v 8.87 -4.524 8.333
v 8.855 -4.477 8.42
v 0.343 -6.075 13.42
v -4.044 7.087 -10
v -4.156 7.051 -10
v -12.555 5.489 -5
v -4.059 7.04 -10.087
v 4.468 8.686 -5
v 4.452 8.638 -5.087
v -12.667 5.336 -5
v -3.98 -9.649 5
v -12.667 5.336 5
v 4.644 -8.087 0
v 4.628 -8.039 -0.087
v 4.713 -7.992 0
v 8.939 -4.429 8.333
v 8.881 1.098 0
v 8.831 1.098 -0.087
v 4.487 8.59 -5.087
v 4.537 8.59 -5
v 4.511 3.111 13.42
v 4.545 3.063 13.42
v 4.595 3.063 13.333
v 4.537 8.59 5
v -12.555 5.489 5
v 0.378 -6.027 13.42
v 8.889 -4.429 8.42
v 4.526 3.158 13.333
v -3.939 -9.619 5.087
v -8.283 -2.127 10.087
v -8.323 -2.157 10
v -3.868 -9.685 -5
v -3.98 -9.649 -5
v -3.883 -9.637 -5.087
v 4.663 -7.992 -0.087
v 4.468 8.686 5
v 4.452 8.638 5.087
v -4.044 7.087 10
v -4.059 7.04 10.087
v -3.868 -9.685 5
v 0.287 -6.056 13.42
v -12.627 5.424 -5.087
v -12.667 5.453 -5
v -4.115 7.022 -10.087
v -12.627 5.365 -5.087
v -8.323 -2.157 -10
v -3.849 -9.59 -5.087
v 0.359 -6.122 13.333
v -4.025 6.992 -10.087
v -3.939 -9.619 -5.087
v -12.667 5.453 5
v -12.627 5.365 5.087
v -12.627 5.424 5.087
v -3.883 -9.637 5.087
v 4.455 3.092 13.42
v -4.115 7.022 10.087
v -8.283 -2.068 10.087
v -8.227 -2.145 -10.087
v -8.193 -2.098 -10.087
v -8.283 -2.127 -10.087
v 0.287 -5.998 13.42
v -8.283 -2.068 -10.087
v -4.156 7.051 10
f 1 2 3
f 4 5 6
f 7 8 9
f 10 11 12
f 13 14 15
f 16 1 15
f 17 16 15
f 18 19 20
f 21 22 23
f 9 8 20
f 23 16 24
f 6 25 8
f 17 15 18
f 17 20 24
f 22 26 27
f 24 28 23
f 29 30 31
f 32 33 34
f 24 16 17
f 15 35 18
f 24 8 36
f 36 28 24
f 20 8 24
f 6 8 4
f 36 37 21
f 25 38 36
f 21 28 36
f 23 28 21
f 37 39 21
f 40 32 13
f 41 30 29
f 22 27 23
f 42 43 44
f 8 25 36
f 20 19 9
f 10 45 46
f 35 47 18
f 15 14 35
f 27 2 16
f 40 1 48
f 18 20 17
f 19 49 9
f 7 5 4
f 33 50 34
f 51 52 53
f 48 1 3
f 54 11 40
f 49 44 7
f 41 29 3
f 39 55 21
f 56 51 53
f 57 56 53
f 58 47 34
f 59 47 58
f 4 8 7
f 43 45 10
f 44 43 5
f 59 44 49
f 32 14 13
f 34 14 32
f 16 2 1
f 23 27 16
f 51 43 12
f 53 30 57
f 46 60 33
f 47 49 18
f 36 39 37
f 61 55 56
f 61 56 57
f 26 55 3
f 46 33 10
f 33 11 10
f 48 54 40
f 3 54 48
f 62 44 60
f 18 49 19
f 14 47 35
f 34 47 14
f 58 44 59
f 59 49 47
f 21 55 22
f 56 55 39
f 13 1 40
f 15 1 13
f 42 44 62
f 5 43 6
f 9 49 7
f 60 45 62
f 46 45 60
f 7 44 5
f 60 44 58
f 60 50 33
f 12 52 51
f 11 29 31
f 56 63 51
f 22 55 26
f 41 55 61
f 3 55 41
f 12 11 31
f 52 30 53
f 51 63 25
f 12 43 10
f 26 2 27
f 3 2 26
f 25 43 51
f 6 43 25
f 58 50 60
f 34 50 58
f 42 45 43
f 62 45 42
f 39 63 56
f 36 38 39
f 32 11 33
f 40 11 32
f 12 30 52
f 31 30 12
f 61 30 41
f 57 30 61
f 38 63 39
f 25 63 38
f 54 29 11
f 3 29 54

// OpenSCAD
// Auto-generated OpenSCAD file

    inner_points = 10*[[-0.4074818991364223, 0.6992365292821007, 1.0000000000000828], [-0.3898663328584005, -0.9589823018207535, -0.5000000000001132], [0.44367143495763933, 0.8590426676513406, 0.5000000000000088], [-0.8242507830446055, -0.20977595545377065, -0.9999999999999784], [-0.8242507830443877, -0.20977595545400485, 1.0000000000000218], [-0.38986633285829164, -0.9589823018208707, 0.4999999999998866], [0.44367143495753053, 0.8590426676514578, -0.4999999999999911], [-0.4074818991366401, 0.6992365292823348, -0.9999999999999172], [-1.2586352332305926, 0.5394303909129777, 0.5000000000001568], [0.46128700123576977, -0.7991761634516306, -1.8726686867864828e-13], [0.8780558851437354, 0.10983632128447508, -1.2620460232426467e-13], [-1.2586352332307016, 0.539430390913095, -0.49999999999984335], [0.44954329038379176, 0.3063030572835663, 1.3333333333332769], [0.032774406475826245, -0.6027094274525393, 1.3333333333332158], [0.883927740569888, -0.44290328908329923, 0.8333333333331419]];

    outer_points = 10*[[-0.2818912922299794, 1.0259982195154702, -0.49281330432121767], [-0.4169920179568701, -1.0259982195154702, 0.38528601131022405], [0.30986993589944156, 1.0873280397967147, 0.31096359384582334], [0.3890133742874079, -1.0873280397967147, -0.20343630083482972], [-0.990100816973316, 0.3215561330780754, -0.5397240271737466], [-1.1065491135872318, -0.3215561330780754, 0.21714214814076563], [0.9994270315298034, 0.38288595335931963, 0.4791074570152818], [1.0972228990307444, -0.38288595335931963, -0.1565255779823009], [-0.18409542472903828, 0.2602263127968311, -1.1284463393188005], [-0.5147878854578112, -0.2602263127968311, 1.0209190463078066], [0.1934216392855257, 0.4442157736405639, 1.0678297691603356], [0.5054616709013238, -0.4442157736405639, -0.9603024761493418], [-0.654573100183338, 1.342585342036261, 0.3794715481636927], [-1.3627826249266748, 0.6381432555988661, 0.33256082531116393], [-0.7710213967972539, 0.6994730758801104, 1.1363377234782046]];

    // Convex hull for inner set (I)
    module inner_hull() {
        hull() {
            for (p = inner_points) {
                translate(p) sphere(r=0.1);
            }
        }
    }

    // Convex hull for outer set (O) minus inner hull (O \ I)
    module outer_minus_inner() {
        difference() {
            hull() {
                for (p = outer_points) {
                    translate(p) sphere(r=0.1);
                }
            }
            inner_hull(); // Subtract inner hull
        }
    }

    // Convex hull for outer set (O) minus all translated inner hulls
    module outer_minus_AllTranslationInner() {
        difference() {
            hull() {
                for (p = outer_points) {
                    translate(p) sphere(r=0.1);
                }
            }
            hull() {
                translate([0,0,50]) inner_hull();
                translate([0,0,-50]) inner_hull();
            }; // Subtract translated inner hulls
        }
    }

    // Difference between outer_minus_inner and outer_minus_AllTranslationInner
    module outer_minus_inner_diff() {
        difference() {
            // Outer minus inner
            difference() {
                hull() {
                    for (p = outer_points) {
                        translate(p) sphere(r=0.1);
                    }
                }
                inner_hull();
            }

            // Subtract Outer minus AllTranslationInner
            difference() {
                hull() {
                    for (p = outer_points) {
                        translate(p) sphere(r=0.1);
                    }
                }
                hull() {
                    translate([0,0,50]) inner_hull();
                    translate([0,0,-50]) inner_hull();
                };
            }
        }
    }

    // Rendering all with colors applied
    color([1, 0, 0, 0.5]) inner_hull(); // Transparent red
    
